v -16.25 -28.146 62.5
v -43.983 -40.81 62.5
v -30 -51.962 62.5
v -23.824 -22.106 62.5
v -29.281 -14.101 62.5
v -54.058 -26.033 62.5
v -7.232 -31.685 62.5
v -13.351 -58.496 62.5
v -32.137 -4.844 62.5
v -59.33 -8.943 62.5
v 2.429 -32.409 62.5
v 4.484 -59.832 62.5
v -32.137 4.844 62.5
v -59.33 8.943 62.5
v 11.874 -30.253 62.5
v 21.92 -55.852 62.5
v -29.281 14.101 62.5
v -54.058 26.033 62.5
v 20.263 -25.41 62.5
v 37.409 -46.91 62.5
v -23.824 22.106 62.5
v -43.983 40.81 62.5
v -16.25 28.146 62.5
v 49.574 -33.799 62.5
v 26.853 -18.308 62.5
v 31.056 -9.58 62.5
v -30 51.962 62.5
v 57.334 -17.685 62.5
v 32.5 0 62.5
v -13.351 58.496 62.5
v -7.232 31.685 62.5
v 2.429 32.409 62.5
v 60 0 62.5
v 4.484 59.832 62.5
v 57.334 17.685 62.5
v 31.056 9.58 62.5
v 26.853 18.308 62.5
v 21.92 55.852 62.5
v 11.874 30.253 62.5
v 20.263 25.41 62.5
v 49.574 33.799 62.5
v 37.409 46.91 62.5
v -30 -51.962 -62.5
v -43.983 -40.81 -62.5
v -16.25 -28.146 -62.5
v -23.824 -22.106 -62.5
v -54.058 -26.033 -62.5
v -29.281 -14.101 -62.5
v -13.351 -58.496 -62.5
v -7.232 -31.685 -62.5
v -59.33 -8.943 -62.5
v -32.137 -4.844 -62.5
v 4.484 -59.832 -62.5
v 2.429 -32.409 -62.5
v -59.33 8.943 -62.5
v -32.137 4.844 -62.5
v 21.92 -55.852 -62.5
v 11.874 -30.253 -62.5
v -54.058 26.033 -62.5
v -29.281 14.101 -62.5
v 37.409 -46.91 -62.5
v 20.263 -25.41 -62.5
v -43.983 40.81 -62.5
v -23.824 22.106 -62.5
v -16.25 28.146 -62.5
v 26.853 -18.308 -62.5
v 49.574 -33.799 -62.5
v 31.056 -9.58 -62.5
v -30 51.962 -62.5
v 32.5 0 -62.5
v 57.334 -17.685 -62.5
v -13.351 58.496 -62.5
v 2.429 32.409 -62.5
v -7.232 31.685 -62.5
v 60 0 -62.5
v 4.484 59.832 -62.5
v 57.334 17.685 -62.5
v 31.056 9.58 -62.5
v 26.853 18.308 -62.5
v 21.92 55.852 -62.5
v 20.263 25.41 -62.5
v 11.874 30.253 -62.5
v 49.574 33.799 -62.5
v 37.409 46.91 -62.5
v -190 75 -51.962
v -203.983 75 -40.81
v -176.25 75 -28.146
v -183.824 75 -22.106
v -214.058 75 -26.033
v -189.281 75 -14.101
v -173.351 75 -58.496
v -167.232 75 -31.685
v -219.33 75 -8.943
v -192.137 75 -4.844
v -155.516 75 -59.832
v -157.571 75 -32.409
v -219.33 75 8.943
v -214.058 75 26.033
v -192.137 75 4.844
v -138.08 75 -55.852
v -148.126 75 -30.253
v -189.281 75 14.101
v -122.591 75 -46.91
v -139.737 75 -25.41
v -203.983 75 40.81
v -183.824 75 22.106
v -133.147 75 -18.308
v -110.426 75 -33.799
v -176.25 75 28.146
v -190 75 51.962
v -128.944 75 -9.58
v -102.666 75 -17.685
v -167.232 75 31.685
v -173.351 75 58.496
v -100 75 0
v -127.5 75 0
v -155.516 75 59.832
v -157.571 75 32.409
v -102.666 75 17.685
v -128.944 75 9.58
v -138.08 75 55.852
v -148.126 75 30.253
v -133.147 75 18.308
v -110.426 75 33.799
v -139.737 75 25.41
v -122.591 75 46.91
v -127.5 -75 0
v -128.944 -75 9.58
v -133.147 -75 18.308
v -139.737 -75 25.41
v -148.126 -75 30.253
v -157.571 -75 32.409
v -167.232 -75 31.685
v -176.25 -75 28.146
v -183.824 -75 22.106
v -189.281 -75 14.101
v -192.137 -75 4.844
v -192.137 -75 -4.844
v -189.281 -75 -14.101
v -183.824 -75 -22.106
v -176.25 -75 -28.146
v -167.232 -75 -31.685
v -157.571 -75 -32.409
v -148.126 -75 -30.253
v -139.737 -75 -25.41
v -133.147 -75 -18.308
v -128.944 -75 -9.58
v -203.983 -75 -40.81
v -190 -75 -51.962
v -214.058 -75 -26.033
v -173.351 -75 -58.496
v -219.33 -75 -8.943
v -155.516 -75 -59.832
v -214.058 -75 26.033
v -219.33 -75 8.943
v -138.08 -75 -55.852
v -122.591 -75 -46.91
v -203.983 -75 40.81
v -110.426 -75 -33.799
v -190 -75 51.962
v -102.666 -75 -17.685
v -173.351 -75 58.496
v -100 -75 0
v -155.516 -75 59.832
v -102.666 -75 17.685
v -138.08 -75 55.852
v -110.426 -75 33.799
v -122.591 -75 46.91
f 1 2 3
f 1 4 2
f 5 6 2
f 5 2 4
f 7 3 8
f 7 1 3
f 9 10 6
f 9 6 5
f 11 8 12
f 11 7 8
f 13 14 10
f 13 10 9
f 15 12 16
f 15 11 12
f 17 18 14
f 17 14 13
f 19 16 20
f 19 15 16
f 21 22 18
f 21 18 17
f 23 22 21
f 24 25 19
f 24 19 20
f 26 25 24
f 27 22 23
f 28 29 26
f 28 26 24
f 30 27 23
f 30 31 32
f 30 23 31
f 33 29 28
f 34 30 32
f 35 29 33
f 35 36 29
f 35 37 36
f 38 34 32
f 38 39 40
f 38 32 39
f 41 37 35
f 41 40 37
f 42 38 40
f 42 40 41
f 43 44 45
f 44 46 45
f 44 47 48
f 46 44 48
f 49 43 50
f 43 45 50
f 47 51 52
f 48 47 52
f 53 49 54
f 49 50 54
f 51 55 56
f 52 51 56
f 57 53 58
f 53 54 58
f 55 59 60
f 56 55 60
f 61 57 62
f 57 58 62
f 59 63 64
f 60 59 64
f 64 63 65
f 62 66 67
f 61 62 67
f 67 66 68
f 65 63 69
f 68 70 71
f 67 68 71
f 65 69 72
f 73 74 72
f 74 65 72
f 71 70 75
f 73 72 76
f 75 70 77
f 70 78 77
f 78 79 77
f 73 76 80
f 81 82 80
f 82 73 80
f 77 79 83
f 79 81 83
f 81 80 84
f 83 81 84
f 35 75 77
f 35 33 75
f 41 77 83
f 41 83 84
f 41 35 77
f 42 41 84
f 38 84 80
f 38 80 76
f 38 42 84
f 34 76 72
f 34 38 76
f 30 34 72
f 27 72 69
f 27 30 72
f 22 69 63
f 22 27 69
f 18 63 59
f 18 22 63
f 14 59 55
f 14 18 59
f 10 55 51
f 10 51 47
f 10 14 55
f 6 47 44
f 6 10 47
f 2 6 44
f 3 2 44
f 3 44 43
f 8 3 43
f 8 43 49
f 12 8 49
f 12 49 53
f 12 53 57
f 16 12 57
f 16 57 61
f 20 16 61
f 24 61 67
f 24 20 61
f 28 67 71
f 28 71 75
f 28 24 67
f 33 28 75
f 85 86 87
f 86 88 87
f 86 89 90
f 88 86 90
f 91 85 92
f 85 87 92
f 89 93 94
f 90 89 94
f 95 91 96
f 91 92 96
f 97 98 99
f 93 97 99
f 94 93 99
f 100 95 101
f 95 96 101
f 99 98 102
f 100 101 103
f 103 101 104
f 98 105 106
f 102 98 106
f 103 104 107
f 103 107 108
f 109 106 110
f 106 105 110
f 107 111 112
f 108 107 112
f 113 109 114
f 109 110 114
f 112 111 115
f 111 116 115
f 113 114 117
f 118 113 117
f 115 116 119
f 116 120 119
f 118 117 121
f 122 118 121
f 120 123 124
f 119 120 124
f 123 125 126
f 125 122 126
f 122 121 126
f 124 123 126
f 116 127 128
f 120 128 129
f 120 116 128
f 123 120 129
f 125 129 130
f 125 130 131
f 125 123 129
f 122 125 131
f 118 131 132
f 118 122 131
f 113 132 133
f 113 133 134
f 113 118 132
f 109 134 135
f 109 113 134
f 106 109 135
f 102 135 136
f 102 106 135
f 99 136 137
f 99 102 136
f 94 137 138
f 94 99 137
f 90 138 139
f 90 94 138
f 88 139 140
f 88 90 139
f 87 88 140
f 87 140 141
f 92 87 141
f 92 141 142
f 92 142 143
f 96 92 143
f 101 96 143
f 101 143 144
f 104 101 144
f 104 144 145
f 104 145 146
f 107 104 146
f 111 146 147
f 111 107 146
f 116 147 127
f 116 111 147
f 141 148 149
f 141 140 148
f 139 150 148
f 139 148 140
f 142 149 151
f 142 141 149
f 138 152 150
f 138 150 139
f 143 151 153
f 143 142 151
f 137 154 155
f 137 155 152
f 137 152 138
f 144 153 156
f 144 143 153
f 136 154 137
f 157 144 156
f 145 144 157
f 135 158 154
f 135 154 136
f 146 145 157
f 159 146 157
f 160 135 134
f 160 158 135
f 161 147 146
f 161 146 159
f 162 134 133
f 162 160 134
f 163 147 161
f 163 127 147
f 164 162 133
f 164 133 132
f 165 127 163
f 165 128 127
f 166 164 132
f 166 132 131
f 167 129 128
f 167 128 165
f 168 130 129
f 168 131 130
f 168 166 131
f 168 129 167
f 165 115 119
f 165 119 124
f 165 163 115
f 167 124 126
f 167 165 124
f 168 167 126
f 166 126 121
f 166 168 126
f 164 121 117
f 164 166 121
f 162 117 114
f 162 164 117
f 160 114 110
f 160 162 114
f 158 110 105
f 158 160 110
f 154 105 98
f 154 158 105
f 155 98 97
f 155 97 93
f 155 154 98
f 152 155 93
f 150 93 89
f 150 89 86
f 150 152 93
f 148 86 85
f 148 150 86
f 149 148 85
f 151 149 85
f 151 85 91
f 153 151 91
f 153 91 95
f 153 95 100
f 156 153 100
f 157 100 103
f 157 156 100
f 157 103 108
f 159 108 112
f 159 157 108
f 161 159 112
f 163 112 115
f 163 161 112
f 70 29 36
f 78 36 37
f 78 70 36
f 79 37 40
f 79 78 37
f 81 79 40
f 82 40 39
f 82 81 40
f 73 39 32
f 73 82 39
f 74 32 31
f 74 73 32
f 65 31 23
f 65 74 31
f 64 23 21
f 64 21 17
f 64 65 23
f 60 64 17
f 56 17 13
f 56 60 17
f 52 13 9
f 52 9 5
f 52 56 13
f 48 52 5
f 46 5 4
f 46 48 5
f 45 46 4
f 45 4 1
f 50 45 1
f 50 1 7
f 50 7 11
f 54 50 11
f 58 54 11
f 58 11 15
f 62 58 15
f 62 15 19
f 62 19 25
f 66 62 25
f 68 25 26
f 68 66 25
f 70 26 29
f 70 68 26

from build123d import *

# Parameters (mm, degrees)
F0_R     = 60
F0_R_2   = 32.5
F1_DEPTH = 62.5
F2_R     = 60
F2_R_2   = 32.5
F3_DEPTH = 75


with BuildPart() as f1:
    # F0 (on Top) → F1 (new body, symmetric)
    with BuildSketch(Plane.XY):
        Circle(F0_R)
        Circle(F0_R_2, mode=Mode.SUBTRACT)
    extrude(amount=F1_DEPTH, both=True)


with BuildPart() as f3:
    # F2 (on Front) → F3 (new body, symmetric)
    with BuildSketch(Plane.XZ):
        with Locations((-160, 0)):
            Circle(F2_R)
        with Locations((-160, 0)):
            Circle(F2_R_2, mode=Mode.SUBTRACT)
    extrude(amount=F3_DEPTH, both=True)


solid = Compound([f1.part, f3.part])
